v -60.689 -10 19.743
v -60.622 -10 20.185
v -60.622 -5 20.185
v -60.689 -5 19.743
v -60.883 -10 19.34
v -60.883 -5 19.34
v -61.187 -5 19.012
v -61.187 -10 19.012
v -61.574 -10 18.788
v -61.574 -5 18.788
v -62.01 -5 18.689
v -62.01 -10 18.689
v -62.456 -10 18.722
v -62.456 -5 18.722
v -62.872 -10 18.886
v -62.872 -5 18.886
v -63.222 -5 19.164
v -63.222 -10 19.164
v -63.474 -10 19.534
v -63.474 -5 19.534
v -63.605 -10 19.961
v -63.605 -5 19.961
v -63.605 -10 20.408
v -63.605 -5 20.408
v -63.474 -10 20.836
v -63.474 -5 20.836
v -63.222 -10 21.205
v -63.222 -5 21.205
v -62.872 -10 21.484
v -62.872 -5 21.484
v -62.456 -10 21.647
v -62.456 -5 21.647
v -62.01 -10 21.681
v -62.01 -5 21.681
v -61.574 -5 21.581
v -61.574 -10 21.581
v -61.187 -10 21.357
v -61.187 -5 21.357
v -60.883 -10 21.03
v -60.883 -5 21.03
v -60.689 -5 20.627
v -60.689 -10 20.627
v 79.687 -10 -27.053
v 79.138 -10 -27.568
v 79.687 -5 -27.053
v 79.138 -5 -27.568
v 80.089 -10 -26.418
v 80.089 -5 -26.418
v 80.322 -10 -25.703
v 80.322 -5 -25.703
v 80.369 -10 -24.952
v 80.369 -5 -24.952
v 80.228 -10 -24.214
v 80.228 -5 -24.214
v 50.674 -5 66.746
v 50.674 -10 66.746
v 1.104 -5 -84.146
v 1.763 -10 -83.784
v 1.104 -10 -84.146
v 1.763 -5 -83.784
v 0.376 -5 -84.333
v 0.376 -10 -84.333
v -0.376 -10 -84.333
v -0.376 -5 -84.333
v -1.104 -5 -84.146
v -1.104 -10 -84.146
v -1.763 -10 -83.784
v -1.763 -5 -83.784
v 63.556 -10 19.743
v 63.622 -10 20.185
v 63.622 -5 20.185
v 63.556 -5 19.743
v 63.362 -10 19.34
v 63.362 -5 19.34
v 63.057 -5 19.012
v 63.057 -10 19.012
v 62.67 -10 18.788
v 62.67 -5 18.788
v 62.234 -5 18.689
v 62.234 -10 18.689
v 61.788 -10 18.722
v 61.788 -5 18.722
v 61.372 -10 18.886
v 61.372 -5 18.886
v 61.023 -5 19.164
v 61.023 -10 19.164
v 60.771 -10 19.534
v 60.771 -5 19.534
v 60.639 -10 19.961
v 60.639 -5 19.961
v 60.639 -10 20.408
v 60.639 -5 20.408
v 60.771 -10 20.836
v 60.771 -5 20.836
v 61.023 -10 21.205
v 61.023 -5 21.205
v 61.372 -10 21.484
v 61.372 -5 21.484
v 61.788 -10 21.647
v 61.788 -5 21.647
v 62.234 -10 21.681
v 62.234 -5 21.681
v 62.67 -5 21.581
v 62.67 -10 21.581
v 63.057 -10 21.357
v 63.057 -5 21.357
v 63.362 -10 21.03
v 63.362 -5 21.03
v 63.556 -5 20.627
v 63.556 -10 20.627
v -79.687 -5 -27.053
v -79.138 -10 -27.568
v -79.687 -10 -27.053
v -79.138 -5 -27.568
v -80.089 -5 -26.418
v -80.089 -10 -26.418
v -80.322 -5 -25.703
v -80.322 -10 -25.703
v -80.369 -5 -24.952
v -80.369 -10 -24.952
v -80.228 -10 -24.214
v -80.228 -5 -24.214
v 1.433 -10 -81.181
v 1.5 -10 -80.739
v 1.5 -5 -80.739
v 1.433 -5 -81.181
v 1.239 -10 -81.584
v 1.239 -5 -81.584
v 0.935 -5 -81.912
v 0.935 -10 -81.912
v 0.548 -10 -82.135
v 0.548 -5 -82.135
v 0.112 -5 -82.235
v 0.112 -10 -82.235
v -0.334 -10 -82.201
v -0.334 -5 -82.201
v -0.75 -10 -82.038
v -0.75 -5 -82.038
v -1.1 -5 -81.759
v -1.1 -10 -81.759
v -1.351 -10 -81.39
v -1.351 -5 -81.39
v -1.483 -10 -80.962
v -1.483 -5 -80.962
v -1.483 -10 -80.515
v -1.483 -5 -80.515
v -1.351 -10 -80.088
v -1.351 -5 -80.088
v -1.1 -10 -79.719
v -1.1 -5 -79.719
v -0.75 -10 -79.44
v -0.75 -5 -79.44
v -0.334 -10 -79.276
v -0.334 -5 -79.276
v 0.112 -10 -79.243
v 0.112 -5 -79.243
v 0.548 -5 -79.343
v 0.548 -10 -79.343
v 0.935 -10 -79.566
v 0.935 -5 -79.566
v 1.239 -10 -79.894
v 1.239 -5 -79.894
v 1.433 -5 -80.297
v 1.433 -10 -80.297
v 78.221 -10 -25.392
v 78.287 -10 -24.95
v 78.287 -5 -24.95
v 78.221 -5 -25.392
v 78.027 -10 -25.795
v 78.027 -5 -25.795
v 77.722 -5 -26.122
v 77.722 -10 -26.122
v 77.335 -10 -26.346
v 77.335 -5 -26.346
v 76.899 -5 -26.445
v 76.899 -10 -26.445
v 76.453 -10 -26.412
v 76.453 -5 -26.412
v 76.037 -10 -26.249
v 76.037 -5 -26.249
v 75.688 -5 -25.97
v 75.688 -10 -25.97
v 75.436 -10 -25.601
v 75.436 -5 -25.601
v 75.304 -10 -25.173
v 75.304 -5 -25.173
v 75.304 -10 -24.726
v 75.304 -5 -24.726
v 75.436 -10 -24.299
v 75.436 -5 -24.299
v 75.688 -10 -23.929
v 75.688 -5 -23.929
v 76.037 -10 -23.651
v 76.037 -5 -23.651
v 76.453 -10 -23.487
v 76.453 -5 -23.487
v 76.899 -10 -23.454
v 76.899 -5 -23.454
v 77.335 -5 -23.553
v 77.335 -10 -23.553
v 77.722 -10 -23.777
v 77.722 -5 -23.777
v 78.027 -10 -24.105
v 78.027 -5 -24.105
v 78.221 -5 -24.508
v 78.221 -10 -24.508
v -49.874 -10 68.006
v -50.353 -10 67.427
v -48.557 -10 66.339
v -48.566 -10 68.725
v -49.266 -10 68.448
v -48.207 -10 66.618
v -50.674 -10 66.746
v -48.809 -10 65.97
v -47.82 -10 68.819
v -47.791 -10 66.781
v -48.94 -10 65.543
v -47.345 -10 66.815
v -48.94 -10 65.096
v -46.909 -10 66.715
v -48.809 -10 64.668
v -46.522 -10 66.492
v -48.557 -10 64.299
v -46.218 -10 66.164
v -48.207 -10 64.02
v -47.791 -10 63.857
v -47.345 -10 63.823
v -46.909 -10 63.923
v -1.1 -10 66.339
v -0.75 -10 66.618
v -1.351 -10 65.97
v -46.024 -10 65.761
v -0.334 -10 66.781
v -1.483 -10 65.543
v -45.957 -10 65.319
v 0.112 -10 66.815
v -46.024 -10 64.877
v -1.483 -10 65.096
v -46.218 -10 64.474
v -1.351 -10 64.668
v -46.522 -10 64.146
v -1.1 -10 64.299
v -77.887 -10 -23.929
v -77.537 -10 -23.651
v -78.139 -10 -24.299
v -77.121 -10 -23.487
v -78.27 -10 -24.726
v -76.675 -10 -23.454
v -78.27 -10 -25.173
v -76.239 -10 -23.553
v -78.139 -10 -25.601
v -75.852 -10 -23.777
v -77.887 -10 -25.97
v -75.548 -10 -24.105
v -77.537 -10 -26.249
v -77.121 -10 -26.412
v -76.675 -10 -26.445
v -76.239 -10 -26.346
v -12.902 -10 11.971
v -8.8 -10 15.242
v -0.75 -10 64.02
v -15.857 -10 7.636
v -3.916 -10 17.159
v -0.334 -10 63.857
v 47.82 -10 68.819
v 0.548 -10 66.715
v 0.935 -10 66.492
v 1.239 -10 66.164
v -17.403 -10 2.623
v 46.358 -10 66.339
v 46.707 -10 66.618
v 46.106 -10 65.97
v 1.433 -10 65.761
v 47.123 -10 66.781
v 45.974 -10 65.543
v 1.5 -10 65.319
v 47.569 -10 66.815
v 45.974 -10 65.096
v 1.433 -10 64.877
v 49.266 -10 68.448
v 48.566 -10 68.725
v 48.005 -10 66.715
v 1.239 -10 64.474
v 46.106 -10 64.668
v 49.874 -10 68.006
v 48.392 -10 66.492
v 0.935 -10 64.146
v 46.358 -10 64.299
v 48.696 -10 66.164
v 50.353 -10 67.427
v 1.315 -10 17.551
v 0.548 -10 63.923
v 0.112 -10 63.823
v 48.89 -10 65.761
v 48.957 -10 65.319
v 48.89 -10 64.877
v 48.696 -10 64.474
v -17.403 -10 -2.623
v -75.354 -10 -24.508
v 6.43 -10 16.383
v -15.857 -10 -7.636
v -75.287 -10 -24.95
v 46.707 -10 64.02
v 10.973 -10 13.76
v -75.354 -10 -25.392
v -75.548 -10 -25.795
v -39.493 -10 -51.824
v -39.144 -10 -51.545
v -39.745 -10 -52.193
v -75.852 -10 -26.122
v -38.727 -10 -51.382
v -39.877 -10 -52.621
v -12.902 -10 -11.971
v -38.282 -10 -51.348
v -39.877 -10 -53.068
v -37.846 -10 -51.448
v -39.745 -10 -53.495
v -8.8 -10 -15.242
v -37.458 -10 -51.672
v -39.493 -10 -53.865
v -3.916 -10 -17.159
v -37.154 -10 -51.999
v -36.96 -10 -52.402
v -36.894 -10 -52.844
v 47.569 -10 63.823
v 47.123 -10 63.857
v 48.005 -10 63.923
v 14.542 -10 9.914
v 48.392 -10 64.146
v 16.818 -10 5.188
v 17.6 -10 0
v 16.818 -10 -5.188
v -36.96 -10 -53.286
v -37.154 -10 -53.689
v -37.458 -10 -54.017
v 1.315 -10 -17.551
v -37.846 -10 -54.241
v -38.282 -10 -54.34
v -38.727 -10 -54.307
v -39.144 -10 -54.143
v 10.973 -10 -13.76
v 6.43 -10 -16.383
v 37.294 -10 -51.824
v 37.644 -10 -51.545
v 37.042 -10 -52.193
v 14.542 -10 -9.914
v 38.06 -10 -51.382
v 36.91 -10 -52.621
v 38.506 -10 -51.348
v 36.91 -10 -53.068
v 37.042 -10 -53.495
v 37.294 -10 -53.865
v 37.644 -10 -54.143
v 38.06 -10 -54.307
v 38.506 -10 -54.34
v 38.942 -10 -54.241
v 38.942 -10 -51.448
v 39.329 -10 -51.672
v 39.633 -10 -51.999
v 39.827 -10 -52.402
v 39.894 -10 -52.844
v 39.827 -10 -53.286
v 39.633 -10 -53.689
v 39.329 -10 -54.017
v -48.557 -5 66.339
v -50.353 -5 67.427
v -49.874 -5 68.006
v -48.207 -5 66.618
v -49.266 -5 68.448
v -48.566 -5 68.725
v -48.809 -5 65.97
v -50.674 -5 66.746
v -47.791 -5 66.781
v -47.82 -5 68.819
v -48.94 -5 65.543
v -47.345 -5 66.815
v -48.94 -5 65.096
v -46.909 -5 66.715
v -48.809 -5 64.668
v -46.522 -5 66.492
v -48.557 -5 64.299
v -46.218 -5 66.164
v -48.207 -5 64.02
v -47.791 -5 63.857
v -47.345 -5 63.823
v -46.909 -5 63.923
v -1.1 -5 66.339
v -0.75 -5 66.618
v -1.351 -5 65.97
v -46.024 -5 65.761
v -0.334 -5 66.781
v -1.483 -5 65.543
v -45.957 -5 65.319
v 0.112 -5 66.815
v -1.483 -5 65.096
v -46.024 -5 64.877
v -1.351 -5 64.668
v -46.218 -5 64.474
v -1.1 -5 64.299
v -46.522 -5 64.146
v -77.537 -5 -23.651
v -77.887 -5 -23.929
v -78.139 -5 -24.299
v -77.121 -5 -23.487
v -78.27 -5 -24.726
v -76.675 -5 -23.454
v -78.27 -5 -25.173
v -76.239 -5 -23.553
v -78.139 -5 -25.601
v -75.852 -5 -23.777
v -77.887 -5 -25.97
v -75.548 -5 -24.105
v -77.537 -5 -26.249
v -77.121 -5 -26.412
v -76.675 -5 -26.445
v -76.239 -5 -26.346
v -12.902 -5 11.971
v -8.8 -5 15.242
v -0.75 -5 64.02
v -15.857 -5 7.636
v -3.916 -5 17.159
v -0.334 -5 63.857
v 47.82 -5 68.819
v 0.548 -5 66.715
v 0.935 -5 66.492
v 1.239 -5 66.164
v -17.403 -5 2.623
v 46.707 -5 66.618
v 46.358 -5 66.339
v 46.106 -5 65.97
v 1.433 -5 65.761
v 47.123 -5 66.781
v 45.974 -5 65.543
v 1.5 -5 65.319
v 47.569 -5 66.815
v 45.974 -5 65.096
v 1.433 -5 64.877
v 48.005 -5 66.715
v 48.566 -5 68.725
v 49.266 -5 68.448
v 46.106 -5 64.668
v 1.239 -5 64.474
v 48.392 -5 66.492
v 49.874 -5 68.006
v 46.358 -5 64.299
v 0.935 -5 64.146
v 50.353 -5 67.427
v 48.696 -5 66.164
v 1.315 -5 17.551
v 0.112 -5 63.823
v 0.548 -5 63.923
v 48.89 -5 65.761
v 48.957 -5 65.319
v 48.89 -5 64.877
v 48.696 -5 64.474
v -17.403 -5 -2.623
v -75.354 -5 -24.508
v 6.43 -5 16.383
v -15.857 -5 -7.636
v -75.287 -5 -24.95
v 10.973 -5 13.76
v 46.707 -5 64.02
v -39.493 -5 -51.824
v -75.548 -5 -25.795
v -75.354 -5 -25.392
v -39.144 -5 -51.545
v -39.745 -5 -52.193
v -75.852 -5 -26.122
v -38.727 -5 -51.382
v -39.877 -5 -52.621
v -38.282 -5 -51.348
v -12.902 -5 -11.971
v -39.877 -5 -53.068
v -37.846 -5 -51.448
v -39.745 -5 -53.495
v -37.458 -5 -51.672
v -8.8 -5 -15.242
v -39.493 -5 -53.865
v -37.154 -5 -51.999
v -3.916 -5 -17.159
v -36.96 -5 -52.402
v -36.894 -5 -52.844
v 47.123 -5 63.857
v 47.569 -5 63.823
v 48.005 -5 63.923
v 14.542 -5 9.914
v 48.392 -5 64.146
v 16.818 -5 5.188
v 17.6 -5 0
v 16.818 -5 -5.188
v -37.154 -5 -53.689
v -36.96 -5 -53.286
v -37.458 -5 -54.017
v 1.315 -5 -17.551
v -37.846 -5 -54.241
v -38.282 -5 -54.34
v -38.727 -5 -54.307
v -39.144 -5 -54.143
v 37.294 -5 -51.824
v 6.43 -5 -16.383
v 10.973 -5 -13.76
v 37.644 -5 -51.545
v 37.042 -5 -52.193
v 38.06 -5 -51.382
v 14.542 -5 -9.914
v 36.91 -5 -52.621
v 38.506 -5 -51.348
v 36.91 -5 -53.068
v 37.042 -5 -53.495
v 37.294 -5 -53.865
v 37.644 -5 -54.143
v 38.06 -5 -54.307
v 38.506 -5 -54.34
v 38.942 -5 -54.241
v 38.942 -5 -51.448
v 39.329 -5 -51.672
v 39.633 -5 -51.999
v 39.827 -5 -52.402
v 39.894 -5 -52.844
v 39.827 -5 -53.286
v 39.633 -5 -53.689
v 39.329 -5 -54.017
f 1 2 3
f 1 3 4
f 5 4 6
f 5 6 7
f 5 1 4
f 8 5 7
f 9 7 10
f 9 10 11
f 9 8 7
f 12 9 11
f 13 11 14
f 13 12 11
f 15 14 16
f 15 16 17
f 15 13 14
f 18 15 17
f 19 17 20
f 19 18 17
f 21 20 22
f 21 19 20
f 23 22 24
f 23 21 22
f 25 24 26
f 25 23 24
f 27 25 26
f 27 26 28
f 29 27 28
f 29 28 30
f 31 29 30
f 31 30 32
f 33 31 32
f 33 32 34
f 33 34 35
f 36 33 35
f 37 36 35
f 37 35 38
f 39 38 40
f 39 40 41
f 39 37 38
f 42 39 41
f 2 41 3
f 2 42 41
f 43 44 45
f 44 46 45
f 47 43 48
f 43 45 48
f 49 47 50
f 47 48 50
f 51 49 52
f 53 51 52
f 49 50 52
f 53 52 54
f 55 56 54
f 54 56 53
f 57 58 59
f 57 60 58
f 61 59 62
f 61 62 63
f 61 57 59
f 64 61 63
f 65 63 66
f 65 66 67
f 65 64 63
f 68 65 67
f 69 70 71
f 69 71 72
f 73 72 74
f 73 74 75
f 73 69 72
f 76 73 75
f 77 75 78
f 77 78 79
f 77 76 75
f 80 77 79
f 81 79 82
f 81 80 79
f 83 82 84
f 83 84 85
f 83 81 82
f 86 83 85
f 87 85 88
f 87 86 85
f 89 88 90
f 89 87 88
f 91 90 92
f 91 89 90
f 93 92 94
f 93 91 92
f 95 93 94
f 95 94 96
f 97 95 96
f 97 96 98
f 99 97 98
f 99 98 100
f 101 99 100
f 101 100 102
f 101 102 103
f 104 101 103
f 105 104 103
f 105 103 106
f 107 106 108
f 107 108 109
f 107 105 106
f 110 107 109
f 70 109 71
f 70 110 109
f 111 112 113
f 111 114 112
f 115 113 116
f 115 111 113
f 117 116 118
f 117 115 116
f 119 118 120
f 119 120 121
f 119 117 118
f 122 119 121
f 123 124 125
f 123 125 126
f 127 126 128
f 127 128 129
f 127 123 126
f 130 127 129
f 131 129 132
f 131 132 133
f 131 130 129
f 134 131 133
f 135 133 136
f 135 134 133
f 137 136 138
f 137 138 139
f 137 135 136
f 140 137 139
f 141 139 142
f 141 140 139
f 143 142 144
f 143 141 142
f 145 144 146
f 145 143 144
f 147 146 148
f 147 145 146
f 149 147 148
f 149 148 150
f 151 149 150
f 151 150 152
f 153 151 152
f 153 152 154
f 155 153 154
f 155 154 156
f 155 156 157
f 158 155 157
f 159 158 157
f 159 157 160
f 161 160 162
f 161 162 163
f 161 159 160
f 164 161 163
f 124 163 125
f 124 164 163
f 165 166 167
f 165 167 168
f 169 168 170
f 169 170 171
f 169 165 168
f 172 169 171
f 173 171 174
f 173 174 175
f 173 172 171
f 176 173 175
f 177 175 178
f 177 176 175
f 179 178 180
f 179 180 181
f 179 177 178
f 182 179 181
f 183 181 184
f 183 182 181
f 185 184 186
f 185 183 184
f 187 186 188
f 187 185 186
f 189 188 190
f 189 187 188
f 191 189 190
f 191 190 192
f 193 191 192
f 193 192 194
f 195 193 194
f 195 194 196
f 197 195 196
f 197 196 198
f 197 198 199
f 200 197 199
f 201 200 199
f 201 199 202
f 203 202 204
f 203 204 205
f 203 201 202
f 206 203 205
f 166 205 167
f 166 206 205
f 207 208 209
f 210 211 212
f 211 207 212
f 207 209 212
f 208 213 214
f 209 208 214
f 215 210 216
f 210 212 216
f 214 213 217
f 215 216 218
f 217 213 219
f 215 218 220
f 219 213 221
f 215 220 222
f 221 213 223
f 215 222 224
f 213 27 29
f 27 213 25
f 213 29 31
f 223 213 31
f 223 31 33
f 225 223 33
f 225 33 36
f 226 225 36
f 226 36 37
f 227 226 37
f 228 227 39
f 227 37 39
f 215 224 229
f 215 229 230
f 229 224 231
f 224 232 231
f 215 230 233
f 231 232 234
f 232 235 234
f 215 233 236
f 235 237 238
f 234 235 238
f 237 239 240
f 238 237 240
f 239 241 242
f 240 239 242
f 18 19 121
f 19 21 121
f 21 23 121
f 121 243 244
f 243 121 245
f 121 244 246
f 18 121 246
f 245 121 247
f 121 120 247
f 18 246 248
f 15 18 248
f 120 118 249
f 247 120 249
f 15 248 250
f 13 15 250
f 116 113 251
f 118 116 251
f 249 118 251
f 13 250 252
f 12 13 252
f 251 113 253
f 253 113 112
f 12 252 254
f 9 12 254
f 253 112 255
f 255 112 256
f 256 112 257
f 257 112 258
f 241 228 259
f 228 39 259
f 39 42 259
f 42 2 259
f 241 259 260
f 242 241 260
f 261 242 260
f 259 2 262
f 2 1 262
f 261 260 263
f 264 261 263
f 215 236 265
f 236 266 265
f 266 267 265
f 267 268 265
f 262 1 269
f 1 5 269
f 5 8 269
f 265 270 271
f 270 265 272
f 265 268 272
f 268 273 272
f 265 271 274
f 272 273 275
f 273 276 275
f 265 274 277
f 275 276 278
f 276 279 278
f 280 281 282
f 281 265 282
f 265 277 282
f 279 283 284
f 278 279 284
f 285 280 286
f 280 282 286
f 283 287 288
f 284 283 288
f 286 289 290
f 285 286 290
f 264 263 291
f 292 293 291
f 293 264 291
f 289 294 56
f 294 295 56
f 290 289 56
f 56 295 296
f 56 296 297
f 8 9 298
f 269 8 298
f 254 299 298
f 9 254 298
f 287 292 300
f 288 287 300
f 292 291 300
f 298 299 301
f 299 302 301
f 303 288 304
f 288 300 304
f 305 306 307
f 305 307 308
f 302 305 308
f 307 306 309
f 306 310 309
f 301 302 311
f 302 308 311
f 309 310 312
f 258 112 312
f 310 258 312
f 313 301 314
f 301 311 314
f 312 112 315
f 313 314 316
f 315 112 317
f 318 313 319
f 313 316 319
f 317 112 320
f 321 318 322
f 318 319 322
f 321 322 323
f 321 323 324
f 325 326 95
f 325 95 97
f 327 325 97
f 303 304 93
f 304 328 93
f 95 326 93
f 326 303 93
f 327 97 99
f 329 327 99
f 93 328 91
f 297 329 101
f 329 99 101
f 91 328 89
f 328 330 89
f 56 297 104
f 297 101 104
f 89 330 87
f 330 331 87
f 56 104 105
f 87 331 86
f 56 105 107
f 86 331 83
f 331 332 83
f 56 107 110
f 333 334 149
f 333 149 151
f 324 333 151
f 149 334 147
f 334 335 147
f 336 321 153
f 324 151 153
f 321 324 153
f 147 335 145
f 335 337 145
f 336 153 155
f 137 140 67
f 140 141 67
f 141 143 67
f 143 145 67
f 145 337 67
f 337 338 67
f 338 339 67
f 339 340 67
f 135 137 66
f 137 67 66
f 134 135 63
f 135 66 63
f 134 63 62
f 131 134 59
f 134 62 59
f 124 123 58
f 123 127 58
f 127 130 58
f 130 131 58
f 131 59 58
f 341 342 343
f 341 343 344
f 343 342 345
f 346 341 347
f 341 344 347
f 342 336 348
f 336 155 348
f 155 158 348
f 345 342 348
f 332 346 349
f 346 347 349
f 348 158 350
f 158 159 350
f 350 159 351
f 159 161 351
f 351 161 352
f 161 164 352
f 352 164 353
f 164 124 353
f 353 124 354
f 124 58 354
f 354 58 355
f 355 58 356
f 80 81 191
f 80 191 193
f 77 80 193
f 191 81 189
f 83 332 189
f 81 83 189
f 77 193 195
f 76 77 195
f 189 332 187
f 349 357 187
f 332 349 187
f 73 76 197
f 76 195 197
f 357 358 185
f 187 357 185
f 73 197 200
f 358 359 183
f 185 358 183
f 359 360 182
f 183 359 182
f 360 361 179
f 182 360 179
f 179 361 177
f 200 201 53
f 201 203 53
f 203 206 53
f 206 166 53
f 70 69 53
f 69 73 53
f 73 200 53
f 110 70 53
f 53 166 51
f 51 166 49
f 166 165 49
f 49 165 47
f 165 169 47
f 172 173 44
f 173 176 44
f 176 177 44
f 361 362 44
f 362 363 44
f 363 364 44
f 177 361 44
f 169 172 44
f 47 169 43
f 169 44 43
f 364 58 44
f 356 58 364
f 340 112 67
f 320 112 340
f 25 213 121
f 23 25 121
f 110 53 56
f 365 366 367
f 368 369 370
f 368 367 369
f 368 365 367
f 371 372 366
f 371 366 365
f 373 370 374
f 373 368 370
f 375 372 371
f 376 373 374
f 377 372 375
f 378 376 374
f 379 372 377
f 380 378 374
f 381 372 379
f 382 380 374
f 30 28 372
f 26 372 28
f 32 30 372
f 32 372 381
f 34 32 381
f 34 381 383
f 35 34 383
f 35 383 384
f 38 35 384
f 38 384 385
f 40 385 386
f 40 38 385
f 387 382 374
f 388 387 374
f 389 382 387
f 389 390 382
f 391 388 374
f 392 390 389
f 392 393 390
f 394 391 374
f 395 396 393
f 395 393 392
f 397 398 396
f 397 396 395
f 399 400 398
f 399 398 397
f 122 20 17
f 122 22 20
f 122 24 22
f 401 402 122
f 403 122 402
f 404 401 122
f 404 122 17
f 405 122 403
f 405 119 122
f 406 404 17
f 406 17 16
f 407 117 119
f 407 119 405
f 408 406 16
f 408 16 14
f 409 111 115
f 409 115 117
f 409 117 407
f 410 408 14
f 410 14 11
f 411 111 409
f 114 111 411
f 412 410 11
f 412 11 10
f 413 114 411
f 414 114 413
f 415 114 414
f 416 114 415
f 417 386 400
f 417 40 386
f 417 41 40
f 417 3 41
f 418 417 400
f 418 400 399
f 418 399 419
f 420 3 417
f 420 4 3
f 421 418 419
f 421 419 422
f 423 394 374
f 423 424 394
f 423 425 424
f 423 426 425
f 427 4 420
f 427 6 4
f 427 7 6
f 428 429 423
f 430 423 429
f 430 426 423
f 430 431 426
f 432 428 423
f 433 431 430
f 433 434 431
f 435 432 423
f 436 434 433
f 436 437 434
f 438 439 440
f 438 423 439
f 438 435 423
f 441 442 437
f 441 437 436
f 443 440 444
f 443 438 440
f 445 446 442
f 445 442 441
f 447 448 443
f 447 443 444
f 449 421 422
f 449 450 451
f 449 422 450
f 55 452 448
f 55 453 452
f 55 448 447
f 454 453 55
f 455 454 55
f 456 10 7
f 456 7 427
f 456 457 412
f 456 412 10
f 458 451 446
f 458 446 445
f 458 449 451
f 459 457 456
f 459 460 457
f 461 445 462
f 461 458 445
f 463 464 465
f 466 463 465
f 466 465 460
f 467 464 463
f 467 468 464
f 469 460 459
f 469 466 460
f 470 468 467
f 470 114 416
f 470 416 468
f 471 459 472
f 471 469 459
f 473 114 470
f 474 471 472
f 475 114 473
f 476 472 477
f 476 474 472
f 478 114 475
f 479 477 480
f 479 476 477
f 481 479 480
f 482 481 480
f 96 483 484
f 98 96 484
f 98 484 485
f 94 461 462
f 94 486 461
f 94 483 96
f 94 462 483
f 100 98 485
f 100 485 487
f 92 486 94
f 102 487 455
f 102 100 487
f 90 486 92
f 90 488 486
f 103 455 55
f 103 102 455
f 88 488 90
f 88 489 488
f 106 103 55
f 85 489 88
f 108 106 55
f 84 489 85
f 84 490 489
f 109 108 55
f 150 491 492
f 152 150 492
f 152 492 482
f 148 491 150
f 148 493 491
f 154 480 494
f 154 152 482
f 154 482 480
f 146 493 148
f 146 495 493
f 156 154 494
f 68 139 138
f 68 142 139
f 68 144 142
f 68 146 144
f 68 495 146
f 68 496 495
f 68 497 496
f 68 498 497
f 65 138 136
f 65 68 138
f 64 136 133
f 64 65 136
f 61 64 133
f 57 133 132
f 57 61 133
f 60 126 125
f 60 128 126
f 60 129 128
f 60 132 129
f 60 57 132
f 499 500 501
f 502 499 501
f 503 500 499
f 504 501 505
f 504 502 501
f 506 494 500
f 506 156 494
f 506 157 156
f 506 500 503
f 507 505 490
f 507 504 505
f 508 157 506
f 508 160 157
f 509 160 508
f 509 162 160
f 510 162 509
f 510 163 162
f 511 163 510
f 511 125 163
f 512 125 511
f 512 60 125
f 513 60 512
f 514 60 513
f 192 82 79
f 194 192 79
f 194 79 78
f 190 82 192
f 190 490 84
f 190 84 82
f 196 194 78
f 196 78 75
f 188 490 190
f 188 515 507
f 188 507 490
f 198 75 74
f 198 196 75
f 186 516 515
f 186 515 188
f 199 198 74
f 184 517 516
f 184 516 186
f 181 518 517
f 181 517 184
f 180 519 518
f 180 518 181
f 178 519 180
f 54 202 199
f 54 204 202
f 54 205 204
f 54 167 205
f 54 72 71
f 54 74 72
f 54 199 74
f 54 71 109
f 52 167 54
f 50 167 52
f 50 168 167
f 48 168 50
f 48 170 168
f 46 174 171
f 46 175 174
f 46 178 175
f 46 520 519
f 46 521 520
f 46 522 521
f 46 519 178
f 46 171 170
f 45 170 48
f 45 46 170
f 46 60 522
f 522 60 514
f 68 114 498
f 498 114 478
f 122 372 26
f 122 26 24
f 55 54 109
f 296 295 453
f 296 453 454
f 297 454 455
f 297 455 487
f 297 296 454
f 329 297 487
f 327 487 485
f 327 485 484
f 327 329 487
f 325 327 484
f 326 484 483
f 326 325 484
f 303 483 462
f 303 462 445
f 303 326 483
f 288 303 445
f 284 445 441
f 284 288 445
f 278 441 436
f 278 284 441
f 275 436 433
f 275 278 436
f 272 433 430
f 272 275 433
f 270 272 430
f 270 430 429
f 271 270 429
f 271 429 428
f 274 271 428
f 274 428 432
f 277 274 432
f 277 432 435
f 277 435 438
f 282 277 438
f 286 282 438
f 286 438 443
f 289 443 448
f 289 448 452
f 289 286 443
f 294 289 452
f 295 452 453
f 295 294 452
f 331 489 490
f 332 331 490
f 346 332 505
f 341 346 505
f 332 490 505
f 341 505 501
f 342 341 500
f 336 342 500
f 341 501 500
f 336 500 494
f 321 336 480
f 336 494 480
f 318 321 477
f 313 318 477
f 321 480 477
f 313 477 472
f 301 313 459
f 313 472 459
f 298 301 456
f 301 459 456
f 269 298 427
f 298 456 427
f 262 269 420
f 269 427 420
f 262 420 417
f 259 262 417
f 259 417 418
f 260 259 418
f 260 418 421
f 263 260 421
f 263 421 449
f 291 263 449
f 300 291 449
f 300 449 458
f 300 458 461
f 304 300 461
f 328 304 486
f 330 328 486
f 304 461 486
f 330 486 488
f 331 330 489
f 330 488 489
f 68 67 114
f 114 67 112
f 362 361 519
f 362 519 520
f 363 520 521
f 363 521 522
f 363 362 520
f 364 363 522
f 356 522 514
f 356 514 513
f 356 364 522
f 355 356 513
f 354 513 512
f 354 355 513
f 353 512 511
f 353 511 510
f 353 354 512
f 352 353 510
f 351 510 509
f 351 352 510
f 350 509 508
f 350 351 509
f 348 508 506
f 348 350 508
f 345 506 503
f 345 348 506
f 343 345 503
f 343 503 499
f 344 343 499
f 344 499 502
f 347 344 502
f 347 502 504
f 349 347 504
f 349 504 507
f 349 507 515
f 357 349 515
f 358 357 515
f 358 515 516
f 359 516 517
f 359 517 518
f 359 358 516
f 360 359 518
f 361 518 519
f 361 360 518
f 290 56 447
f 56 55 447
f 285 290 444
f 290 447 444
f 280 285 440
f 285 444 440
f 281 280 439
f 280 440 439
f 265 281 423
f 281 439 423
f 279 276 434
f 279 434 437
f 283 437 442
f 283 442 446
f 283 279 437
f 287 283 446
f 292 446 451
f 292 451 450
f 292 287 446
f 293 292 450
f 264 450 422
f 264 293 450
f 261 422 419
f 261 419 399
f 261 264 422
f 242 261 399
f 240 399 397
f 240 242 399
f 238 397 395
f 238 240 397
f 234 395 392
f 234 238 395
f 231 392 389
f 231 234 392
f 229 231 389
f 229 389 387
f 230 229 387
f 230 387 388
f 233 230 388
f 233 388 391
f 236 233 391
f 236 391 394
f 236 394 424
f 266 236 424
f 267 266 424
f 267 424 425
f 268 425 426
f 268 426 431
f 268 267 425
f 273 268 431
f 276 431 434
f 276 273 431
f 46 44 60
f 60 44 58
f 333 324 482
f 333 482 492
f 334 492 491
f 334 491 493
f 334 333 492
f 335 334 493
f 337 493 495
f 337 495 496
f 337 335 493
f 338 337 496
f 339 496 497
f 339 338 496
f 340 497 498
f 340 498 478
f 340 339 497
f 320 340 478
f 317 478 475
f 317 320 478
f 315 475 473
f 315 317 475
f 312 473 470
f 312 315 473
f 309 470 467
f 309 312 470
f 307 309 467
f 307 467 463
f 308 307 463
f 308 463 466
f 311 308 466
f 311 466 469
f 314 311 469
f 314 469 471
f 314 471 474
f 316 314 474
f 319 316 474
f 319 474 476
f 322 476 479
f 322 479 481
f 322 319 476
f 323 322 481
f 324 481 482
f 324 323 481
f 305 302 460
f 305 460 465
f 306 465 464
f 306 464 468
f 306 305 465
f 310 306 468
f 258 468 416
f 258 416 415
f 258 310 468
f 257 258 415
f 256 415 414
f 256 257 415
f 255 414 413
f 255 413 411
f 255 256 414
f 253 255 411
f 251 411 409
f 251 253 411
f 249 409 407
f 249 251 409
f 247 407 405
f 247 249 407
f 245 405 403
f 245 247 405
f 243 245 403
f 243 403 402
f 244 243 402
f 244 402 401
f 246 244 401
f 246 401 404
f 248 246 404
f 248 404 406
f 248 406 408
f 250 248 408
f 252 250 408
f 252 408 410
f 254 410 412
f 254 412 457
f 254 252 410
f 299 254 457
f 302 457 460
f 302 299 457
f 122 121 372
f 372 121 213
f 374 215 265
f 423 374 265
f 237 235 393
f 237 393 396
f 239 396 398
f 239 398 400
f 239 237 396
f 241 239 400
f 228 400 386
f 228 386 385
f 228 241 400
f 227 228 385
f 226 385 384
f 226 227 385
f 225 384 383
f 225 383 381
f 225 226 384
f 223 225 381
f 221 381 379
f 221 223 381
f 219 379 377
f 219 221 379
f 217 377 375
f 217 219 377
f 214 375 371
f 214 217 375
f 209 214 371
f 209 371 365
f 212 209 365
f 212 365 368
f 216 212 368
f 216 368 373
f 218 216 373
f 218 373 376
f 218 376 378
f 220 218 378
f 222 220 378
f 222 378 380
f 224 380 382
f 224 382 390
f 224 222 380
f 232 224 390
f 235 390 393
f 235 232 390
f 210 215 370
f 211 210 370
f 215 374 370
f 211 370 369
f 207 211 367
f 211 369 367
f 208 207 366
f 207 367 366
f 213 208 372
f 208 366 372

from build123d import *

# Parameters (mm, degrees)
SKETCH7_R           = 1.5
BOSS_EXTRUDE1_DEPTH = 5
SKETCH8_R           = 17.6
CUT_EXTRUDE1_DEPTH  = 5
FILLET1_R           = 3


with BuildPart() as part:
    # Sketch7 → Boss-Extrude1 (new body)
    with BuildSketch(Plane(origin=(0, -10, 0), x_dir=(1, 0, 0), z_dir=(0, 1, 0))):
        Polygon((80.901699437, 26.286555606), (0, 85.065080835), (-80.901699437, 26.286555606), (-50, -68.819096024), (50, -68.819096024), align=None)
        with Locations((62.122151912, -20.184710728)):
            Circle(SKETCH7_R, mode=Mode.SUBTRACT)
        with Locations((47.457101152, -65.319096024)):
            Circle(SKETCH7_R, mode=Mode.SUBTRACT)
        with Locations((0, -65.319096024)):
            Circle(SKETCH7_R, mode=Mode.SUBTRACT)
        with Locations((-47.457101152, -65.319096024)):
            Circle(SKETCH7_R, mode=Mode.SUBTRACT)
        with Locations((-62.122151912, -20.184710728)):
            Circle(SKETCH7_R, mode=Mode.SUBTRACT)
        with Locations((-76.787202671, 24.949674567)):
            Circle(SKETCH7_R, mode=Mode.SUBTRACT)
        with Locations((-38.393601336, 52.84425874)):
            Circle(SKETCH7_R, mode=Mode.SUBTRACT)
        with Locations((0, 80.738842914)):
            Circle(SKETCH7_R, mode=Mode.SUBTRACT)
        with Locations((76.787202671, 24.949674567)):
            Circle(SKETCH7_R, mode=Mode.SUBTRACT)
        with Locations((38.393601336, 52.84425874)):
            Circle(SKETCH7_R, mode=Mode.SUBTRACT)
    extrude(amount=BOSS_EXTRUDE1_DEPTH)

    # Sketch8 → Cut-Extrude1 (cut)
    with BuildSketch(Plane(origin=(0, -5, 0), x_dir=(1, 0, 0), z_dir=(0, 1, 0))):
        Circle(SKETCH8_R)
    extrude(amount=-CUT_EXTRUDE1_DEPTH, mode=Mode.SUBTRACT)

    # Fillet1
    fillet1_edges = [part.edges().sort_by_distance(p)[0] for p in [
        (50, -7.5, 68.819096024),
        (-50, -7.5, 68.819096024),
        (-80.901699437, -7.5, -26.286555606),
        (0, -7.5, -85.065080835),
        (80.901699437, -7.5, -26.286555606),
    ]]
    fillet(fillet1_edges, radius=FILLET1_R)


solid = part.part
